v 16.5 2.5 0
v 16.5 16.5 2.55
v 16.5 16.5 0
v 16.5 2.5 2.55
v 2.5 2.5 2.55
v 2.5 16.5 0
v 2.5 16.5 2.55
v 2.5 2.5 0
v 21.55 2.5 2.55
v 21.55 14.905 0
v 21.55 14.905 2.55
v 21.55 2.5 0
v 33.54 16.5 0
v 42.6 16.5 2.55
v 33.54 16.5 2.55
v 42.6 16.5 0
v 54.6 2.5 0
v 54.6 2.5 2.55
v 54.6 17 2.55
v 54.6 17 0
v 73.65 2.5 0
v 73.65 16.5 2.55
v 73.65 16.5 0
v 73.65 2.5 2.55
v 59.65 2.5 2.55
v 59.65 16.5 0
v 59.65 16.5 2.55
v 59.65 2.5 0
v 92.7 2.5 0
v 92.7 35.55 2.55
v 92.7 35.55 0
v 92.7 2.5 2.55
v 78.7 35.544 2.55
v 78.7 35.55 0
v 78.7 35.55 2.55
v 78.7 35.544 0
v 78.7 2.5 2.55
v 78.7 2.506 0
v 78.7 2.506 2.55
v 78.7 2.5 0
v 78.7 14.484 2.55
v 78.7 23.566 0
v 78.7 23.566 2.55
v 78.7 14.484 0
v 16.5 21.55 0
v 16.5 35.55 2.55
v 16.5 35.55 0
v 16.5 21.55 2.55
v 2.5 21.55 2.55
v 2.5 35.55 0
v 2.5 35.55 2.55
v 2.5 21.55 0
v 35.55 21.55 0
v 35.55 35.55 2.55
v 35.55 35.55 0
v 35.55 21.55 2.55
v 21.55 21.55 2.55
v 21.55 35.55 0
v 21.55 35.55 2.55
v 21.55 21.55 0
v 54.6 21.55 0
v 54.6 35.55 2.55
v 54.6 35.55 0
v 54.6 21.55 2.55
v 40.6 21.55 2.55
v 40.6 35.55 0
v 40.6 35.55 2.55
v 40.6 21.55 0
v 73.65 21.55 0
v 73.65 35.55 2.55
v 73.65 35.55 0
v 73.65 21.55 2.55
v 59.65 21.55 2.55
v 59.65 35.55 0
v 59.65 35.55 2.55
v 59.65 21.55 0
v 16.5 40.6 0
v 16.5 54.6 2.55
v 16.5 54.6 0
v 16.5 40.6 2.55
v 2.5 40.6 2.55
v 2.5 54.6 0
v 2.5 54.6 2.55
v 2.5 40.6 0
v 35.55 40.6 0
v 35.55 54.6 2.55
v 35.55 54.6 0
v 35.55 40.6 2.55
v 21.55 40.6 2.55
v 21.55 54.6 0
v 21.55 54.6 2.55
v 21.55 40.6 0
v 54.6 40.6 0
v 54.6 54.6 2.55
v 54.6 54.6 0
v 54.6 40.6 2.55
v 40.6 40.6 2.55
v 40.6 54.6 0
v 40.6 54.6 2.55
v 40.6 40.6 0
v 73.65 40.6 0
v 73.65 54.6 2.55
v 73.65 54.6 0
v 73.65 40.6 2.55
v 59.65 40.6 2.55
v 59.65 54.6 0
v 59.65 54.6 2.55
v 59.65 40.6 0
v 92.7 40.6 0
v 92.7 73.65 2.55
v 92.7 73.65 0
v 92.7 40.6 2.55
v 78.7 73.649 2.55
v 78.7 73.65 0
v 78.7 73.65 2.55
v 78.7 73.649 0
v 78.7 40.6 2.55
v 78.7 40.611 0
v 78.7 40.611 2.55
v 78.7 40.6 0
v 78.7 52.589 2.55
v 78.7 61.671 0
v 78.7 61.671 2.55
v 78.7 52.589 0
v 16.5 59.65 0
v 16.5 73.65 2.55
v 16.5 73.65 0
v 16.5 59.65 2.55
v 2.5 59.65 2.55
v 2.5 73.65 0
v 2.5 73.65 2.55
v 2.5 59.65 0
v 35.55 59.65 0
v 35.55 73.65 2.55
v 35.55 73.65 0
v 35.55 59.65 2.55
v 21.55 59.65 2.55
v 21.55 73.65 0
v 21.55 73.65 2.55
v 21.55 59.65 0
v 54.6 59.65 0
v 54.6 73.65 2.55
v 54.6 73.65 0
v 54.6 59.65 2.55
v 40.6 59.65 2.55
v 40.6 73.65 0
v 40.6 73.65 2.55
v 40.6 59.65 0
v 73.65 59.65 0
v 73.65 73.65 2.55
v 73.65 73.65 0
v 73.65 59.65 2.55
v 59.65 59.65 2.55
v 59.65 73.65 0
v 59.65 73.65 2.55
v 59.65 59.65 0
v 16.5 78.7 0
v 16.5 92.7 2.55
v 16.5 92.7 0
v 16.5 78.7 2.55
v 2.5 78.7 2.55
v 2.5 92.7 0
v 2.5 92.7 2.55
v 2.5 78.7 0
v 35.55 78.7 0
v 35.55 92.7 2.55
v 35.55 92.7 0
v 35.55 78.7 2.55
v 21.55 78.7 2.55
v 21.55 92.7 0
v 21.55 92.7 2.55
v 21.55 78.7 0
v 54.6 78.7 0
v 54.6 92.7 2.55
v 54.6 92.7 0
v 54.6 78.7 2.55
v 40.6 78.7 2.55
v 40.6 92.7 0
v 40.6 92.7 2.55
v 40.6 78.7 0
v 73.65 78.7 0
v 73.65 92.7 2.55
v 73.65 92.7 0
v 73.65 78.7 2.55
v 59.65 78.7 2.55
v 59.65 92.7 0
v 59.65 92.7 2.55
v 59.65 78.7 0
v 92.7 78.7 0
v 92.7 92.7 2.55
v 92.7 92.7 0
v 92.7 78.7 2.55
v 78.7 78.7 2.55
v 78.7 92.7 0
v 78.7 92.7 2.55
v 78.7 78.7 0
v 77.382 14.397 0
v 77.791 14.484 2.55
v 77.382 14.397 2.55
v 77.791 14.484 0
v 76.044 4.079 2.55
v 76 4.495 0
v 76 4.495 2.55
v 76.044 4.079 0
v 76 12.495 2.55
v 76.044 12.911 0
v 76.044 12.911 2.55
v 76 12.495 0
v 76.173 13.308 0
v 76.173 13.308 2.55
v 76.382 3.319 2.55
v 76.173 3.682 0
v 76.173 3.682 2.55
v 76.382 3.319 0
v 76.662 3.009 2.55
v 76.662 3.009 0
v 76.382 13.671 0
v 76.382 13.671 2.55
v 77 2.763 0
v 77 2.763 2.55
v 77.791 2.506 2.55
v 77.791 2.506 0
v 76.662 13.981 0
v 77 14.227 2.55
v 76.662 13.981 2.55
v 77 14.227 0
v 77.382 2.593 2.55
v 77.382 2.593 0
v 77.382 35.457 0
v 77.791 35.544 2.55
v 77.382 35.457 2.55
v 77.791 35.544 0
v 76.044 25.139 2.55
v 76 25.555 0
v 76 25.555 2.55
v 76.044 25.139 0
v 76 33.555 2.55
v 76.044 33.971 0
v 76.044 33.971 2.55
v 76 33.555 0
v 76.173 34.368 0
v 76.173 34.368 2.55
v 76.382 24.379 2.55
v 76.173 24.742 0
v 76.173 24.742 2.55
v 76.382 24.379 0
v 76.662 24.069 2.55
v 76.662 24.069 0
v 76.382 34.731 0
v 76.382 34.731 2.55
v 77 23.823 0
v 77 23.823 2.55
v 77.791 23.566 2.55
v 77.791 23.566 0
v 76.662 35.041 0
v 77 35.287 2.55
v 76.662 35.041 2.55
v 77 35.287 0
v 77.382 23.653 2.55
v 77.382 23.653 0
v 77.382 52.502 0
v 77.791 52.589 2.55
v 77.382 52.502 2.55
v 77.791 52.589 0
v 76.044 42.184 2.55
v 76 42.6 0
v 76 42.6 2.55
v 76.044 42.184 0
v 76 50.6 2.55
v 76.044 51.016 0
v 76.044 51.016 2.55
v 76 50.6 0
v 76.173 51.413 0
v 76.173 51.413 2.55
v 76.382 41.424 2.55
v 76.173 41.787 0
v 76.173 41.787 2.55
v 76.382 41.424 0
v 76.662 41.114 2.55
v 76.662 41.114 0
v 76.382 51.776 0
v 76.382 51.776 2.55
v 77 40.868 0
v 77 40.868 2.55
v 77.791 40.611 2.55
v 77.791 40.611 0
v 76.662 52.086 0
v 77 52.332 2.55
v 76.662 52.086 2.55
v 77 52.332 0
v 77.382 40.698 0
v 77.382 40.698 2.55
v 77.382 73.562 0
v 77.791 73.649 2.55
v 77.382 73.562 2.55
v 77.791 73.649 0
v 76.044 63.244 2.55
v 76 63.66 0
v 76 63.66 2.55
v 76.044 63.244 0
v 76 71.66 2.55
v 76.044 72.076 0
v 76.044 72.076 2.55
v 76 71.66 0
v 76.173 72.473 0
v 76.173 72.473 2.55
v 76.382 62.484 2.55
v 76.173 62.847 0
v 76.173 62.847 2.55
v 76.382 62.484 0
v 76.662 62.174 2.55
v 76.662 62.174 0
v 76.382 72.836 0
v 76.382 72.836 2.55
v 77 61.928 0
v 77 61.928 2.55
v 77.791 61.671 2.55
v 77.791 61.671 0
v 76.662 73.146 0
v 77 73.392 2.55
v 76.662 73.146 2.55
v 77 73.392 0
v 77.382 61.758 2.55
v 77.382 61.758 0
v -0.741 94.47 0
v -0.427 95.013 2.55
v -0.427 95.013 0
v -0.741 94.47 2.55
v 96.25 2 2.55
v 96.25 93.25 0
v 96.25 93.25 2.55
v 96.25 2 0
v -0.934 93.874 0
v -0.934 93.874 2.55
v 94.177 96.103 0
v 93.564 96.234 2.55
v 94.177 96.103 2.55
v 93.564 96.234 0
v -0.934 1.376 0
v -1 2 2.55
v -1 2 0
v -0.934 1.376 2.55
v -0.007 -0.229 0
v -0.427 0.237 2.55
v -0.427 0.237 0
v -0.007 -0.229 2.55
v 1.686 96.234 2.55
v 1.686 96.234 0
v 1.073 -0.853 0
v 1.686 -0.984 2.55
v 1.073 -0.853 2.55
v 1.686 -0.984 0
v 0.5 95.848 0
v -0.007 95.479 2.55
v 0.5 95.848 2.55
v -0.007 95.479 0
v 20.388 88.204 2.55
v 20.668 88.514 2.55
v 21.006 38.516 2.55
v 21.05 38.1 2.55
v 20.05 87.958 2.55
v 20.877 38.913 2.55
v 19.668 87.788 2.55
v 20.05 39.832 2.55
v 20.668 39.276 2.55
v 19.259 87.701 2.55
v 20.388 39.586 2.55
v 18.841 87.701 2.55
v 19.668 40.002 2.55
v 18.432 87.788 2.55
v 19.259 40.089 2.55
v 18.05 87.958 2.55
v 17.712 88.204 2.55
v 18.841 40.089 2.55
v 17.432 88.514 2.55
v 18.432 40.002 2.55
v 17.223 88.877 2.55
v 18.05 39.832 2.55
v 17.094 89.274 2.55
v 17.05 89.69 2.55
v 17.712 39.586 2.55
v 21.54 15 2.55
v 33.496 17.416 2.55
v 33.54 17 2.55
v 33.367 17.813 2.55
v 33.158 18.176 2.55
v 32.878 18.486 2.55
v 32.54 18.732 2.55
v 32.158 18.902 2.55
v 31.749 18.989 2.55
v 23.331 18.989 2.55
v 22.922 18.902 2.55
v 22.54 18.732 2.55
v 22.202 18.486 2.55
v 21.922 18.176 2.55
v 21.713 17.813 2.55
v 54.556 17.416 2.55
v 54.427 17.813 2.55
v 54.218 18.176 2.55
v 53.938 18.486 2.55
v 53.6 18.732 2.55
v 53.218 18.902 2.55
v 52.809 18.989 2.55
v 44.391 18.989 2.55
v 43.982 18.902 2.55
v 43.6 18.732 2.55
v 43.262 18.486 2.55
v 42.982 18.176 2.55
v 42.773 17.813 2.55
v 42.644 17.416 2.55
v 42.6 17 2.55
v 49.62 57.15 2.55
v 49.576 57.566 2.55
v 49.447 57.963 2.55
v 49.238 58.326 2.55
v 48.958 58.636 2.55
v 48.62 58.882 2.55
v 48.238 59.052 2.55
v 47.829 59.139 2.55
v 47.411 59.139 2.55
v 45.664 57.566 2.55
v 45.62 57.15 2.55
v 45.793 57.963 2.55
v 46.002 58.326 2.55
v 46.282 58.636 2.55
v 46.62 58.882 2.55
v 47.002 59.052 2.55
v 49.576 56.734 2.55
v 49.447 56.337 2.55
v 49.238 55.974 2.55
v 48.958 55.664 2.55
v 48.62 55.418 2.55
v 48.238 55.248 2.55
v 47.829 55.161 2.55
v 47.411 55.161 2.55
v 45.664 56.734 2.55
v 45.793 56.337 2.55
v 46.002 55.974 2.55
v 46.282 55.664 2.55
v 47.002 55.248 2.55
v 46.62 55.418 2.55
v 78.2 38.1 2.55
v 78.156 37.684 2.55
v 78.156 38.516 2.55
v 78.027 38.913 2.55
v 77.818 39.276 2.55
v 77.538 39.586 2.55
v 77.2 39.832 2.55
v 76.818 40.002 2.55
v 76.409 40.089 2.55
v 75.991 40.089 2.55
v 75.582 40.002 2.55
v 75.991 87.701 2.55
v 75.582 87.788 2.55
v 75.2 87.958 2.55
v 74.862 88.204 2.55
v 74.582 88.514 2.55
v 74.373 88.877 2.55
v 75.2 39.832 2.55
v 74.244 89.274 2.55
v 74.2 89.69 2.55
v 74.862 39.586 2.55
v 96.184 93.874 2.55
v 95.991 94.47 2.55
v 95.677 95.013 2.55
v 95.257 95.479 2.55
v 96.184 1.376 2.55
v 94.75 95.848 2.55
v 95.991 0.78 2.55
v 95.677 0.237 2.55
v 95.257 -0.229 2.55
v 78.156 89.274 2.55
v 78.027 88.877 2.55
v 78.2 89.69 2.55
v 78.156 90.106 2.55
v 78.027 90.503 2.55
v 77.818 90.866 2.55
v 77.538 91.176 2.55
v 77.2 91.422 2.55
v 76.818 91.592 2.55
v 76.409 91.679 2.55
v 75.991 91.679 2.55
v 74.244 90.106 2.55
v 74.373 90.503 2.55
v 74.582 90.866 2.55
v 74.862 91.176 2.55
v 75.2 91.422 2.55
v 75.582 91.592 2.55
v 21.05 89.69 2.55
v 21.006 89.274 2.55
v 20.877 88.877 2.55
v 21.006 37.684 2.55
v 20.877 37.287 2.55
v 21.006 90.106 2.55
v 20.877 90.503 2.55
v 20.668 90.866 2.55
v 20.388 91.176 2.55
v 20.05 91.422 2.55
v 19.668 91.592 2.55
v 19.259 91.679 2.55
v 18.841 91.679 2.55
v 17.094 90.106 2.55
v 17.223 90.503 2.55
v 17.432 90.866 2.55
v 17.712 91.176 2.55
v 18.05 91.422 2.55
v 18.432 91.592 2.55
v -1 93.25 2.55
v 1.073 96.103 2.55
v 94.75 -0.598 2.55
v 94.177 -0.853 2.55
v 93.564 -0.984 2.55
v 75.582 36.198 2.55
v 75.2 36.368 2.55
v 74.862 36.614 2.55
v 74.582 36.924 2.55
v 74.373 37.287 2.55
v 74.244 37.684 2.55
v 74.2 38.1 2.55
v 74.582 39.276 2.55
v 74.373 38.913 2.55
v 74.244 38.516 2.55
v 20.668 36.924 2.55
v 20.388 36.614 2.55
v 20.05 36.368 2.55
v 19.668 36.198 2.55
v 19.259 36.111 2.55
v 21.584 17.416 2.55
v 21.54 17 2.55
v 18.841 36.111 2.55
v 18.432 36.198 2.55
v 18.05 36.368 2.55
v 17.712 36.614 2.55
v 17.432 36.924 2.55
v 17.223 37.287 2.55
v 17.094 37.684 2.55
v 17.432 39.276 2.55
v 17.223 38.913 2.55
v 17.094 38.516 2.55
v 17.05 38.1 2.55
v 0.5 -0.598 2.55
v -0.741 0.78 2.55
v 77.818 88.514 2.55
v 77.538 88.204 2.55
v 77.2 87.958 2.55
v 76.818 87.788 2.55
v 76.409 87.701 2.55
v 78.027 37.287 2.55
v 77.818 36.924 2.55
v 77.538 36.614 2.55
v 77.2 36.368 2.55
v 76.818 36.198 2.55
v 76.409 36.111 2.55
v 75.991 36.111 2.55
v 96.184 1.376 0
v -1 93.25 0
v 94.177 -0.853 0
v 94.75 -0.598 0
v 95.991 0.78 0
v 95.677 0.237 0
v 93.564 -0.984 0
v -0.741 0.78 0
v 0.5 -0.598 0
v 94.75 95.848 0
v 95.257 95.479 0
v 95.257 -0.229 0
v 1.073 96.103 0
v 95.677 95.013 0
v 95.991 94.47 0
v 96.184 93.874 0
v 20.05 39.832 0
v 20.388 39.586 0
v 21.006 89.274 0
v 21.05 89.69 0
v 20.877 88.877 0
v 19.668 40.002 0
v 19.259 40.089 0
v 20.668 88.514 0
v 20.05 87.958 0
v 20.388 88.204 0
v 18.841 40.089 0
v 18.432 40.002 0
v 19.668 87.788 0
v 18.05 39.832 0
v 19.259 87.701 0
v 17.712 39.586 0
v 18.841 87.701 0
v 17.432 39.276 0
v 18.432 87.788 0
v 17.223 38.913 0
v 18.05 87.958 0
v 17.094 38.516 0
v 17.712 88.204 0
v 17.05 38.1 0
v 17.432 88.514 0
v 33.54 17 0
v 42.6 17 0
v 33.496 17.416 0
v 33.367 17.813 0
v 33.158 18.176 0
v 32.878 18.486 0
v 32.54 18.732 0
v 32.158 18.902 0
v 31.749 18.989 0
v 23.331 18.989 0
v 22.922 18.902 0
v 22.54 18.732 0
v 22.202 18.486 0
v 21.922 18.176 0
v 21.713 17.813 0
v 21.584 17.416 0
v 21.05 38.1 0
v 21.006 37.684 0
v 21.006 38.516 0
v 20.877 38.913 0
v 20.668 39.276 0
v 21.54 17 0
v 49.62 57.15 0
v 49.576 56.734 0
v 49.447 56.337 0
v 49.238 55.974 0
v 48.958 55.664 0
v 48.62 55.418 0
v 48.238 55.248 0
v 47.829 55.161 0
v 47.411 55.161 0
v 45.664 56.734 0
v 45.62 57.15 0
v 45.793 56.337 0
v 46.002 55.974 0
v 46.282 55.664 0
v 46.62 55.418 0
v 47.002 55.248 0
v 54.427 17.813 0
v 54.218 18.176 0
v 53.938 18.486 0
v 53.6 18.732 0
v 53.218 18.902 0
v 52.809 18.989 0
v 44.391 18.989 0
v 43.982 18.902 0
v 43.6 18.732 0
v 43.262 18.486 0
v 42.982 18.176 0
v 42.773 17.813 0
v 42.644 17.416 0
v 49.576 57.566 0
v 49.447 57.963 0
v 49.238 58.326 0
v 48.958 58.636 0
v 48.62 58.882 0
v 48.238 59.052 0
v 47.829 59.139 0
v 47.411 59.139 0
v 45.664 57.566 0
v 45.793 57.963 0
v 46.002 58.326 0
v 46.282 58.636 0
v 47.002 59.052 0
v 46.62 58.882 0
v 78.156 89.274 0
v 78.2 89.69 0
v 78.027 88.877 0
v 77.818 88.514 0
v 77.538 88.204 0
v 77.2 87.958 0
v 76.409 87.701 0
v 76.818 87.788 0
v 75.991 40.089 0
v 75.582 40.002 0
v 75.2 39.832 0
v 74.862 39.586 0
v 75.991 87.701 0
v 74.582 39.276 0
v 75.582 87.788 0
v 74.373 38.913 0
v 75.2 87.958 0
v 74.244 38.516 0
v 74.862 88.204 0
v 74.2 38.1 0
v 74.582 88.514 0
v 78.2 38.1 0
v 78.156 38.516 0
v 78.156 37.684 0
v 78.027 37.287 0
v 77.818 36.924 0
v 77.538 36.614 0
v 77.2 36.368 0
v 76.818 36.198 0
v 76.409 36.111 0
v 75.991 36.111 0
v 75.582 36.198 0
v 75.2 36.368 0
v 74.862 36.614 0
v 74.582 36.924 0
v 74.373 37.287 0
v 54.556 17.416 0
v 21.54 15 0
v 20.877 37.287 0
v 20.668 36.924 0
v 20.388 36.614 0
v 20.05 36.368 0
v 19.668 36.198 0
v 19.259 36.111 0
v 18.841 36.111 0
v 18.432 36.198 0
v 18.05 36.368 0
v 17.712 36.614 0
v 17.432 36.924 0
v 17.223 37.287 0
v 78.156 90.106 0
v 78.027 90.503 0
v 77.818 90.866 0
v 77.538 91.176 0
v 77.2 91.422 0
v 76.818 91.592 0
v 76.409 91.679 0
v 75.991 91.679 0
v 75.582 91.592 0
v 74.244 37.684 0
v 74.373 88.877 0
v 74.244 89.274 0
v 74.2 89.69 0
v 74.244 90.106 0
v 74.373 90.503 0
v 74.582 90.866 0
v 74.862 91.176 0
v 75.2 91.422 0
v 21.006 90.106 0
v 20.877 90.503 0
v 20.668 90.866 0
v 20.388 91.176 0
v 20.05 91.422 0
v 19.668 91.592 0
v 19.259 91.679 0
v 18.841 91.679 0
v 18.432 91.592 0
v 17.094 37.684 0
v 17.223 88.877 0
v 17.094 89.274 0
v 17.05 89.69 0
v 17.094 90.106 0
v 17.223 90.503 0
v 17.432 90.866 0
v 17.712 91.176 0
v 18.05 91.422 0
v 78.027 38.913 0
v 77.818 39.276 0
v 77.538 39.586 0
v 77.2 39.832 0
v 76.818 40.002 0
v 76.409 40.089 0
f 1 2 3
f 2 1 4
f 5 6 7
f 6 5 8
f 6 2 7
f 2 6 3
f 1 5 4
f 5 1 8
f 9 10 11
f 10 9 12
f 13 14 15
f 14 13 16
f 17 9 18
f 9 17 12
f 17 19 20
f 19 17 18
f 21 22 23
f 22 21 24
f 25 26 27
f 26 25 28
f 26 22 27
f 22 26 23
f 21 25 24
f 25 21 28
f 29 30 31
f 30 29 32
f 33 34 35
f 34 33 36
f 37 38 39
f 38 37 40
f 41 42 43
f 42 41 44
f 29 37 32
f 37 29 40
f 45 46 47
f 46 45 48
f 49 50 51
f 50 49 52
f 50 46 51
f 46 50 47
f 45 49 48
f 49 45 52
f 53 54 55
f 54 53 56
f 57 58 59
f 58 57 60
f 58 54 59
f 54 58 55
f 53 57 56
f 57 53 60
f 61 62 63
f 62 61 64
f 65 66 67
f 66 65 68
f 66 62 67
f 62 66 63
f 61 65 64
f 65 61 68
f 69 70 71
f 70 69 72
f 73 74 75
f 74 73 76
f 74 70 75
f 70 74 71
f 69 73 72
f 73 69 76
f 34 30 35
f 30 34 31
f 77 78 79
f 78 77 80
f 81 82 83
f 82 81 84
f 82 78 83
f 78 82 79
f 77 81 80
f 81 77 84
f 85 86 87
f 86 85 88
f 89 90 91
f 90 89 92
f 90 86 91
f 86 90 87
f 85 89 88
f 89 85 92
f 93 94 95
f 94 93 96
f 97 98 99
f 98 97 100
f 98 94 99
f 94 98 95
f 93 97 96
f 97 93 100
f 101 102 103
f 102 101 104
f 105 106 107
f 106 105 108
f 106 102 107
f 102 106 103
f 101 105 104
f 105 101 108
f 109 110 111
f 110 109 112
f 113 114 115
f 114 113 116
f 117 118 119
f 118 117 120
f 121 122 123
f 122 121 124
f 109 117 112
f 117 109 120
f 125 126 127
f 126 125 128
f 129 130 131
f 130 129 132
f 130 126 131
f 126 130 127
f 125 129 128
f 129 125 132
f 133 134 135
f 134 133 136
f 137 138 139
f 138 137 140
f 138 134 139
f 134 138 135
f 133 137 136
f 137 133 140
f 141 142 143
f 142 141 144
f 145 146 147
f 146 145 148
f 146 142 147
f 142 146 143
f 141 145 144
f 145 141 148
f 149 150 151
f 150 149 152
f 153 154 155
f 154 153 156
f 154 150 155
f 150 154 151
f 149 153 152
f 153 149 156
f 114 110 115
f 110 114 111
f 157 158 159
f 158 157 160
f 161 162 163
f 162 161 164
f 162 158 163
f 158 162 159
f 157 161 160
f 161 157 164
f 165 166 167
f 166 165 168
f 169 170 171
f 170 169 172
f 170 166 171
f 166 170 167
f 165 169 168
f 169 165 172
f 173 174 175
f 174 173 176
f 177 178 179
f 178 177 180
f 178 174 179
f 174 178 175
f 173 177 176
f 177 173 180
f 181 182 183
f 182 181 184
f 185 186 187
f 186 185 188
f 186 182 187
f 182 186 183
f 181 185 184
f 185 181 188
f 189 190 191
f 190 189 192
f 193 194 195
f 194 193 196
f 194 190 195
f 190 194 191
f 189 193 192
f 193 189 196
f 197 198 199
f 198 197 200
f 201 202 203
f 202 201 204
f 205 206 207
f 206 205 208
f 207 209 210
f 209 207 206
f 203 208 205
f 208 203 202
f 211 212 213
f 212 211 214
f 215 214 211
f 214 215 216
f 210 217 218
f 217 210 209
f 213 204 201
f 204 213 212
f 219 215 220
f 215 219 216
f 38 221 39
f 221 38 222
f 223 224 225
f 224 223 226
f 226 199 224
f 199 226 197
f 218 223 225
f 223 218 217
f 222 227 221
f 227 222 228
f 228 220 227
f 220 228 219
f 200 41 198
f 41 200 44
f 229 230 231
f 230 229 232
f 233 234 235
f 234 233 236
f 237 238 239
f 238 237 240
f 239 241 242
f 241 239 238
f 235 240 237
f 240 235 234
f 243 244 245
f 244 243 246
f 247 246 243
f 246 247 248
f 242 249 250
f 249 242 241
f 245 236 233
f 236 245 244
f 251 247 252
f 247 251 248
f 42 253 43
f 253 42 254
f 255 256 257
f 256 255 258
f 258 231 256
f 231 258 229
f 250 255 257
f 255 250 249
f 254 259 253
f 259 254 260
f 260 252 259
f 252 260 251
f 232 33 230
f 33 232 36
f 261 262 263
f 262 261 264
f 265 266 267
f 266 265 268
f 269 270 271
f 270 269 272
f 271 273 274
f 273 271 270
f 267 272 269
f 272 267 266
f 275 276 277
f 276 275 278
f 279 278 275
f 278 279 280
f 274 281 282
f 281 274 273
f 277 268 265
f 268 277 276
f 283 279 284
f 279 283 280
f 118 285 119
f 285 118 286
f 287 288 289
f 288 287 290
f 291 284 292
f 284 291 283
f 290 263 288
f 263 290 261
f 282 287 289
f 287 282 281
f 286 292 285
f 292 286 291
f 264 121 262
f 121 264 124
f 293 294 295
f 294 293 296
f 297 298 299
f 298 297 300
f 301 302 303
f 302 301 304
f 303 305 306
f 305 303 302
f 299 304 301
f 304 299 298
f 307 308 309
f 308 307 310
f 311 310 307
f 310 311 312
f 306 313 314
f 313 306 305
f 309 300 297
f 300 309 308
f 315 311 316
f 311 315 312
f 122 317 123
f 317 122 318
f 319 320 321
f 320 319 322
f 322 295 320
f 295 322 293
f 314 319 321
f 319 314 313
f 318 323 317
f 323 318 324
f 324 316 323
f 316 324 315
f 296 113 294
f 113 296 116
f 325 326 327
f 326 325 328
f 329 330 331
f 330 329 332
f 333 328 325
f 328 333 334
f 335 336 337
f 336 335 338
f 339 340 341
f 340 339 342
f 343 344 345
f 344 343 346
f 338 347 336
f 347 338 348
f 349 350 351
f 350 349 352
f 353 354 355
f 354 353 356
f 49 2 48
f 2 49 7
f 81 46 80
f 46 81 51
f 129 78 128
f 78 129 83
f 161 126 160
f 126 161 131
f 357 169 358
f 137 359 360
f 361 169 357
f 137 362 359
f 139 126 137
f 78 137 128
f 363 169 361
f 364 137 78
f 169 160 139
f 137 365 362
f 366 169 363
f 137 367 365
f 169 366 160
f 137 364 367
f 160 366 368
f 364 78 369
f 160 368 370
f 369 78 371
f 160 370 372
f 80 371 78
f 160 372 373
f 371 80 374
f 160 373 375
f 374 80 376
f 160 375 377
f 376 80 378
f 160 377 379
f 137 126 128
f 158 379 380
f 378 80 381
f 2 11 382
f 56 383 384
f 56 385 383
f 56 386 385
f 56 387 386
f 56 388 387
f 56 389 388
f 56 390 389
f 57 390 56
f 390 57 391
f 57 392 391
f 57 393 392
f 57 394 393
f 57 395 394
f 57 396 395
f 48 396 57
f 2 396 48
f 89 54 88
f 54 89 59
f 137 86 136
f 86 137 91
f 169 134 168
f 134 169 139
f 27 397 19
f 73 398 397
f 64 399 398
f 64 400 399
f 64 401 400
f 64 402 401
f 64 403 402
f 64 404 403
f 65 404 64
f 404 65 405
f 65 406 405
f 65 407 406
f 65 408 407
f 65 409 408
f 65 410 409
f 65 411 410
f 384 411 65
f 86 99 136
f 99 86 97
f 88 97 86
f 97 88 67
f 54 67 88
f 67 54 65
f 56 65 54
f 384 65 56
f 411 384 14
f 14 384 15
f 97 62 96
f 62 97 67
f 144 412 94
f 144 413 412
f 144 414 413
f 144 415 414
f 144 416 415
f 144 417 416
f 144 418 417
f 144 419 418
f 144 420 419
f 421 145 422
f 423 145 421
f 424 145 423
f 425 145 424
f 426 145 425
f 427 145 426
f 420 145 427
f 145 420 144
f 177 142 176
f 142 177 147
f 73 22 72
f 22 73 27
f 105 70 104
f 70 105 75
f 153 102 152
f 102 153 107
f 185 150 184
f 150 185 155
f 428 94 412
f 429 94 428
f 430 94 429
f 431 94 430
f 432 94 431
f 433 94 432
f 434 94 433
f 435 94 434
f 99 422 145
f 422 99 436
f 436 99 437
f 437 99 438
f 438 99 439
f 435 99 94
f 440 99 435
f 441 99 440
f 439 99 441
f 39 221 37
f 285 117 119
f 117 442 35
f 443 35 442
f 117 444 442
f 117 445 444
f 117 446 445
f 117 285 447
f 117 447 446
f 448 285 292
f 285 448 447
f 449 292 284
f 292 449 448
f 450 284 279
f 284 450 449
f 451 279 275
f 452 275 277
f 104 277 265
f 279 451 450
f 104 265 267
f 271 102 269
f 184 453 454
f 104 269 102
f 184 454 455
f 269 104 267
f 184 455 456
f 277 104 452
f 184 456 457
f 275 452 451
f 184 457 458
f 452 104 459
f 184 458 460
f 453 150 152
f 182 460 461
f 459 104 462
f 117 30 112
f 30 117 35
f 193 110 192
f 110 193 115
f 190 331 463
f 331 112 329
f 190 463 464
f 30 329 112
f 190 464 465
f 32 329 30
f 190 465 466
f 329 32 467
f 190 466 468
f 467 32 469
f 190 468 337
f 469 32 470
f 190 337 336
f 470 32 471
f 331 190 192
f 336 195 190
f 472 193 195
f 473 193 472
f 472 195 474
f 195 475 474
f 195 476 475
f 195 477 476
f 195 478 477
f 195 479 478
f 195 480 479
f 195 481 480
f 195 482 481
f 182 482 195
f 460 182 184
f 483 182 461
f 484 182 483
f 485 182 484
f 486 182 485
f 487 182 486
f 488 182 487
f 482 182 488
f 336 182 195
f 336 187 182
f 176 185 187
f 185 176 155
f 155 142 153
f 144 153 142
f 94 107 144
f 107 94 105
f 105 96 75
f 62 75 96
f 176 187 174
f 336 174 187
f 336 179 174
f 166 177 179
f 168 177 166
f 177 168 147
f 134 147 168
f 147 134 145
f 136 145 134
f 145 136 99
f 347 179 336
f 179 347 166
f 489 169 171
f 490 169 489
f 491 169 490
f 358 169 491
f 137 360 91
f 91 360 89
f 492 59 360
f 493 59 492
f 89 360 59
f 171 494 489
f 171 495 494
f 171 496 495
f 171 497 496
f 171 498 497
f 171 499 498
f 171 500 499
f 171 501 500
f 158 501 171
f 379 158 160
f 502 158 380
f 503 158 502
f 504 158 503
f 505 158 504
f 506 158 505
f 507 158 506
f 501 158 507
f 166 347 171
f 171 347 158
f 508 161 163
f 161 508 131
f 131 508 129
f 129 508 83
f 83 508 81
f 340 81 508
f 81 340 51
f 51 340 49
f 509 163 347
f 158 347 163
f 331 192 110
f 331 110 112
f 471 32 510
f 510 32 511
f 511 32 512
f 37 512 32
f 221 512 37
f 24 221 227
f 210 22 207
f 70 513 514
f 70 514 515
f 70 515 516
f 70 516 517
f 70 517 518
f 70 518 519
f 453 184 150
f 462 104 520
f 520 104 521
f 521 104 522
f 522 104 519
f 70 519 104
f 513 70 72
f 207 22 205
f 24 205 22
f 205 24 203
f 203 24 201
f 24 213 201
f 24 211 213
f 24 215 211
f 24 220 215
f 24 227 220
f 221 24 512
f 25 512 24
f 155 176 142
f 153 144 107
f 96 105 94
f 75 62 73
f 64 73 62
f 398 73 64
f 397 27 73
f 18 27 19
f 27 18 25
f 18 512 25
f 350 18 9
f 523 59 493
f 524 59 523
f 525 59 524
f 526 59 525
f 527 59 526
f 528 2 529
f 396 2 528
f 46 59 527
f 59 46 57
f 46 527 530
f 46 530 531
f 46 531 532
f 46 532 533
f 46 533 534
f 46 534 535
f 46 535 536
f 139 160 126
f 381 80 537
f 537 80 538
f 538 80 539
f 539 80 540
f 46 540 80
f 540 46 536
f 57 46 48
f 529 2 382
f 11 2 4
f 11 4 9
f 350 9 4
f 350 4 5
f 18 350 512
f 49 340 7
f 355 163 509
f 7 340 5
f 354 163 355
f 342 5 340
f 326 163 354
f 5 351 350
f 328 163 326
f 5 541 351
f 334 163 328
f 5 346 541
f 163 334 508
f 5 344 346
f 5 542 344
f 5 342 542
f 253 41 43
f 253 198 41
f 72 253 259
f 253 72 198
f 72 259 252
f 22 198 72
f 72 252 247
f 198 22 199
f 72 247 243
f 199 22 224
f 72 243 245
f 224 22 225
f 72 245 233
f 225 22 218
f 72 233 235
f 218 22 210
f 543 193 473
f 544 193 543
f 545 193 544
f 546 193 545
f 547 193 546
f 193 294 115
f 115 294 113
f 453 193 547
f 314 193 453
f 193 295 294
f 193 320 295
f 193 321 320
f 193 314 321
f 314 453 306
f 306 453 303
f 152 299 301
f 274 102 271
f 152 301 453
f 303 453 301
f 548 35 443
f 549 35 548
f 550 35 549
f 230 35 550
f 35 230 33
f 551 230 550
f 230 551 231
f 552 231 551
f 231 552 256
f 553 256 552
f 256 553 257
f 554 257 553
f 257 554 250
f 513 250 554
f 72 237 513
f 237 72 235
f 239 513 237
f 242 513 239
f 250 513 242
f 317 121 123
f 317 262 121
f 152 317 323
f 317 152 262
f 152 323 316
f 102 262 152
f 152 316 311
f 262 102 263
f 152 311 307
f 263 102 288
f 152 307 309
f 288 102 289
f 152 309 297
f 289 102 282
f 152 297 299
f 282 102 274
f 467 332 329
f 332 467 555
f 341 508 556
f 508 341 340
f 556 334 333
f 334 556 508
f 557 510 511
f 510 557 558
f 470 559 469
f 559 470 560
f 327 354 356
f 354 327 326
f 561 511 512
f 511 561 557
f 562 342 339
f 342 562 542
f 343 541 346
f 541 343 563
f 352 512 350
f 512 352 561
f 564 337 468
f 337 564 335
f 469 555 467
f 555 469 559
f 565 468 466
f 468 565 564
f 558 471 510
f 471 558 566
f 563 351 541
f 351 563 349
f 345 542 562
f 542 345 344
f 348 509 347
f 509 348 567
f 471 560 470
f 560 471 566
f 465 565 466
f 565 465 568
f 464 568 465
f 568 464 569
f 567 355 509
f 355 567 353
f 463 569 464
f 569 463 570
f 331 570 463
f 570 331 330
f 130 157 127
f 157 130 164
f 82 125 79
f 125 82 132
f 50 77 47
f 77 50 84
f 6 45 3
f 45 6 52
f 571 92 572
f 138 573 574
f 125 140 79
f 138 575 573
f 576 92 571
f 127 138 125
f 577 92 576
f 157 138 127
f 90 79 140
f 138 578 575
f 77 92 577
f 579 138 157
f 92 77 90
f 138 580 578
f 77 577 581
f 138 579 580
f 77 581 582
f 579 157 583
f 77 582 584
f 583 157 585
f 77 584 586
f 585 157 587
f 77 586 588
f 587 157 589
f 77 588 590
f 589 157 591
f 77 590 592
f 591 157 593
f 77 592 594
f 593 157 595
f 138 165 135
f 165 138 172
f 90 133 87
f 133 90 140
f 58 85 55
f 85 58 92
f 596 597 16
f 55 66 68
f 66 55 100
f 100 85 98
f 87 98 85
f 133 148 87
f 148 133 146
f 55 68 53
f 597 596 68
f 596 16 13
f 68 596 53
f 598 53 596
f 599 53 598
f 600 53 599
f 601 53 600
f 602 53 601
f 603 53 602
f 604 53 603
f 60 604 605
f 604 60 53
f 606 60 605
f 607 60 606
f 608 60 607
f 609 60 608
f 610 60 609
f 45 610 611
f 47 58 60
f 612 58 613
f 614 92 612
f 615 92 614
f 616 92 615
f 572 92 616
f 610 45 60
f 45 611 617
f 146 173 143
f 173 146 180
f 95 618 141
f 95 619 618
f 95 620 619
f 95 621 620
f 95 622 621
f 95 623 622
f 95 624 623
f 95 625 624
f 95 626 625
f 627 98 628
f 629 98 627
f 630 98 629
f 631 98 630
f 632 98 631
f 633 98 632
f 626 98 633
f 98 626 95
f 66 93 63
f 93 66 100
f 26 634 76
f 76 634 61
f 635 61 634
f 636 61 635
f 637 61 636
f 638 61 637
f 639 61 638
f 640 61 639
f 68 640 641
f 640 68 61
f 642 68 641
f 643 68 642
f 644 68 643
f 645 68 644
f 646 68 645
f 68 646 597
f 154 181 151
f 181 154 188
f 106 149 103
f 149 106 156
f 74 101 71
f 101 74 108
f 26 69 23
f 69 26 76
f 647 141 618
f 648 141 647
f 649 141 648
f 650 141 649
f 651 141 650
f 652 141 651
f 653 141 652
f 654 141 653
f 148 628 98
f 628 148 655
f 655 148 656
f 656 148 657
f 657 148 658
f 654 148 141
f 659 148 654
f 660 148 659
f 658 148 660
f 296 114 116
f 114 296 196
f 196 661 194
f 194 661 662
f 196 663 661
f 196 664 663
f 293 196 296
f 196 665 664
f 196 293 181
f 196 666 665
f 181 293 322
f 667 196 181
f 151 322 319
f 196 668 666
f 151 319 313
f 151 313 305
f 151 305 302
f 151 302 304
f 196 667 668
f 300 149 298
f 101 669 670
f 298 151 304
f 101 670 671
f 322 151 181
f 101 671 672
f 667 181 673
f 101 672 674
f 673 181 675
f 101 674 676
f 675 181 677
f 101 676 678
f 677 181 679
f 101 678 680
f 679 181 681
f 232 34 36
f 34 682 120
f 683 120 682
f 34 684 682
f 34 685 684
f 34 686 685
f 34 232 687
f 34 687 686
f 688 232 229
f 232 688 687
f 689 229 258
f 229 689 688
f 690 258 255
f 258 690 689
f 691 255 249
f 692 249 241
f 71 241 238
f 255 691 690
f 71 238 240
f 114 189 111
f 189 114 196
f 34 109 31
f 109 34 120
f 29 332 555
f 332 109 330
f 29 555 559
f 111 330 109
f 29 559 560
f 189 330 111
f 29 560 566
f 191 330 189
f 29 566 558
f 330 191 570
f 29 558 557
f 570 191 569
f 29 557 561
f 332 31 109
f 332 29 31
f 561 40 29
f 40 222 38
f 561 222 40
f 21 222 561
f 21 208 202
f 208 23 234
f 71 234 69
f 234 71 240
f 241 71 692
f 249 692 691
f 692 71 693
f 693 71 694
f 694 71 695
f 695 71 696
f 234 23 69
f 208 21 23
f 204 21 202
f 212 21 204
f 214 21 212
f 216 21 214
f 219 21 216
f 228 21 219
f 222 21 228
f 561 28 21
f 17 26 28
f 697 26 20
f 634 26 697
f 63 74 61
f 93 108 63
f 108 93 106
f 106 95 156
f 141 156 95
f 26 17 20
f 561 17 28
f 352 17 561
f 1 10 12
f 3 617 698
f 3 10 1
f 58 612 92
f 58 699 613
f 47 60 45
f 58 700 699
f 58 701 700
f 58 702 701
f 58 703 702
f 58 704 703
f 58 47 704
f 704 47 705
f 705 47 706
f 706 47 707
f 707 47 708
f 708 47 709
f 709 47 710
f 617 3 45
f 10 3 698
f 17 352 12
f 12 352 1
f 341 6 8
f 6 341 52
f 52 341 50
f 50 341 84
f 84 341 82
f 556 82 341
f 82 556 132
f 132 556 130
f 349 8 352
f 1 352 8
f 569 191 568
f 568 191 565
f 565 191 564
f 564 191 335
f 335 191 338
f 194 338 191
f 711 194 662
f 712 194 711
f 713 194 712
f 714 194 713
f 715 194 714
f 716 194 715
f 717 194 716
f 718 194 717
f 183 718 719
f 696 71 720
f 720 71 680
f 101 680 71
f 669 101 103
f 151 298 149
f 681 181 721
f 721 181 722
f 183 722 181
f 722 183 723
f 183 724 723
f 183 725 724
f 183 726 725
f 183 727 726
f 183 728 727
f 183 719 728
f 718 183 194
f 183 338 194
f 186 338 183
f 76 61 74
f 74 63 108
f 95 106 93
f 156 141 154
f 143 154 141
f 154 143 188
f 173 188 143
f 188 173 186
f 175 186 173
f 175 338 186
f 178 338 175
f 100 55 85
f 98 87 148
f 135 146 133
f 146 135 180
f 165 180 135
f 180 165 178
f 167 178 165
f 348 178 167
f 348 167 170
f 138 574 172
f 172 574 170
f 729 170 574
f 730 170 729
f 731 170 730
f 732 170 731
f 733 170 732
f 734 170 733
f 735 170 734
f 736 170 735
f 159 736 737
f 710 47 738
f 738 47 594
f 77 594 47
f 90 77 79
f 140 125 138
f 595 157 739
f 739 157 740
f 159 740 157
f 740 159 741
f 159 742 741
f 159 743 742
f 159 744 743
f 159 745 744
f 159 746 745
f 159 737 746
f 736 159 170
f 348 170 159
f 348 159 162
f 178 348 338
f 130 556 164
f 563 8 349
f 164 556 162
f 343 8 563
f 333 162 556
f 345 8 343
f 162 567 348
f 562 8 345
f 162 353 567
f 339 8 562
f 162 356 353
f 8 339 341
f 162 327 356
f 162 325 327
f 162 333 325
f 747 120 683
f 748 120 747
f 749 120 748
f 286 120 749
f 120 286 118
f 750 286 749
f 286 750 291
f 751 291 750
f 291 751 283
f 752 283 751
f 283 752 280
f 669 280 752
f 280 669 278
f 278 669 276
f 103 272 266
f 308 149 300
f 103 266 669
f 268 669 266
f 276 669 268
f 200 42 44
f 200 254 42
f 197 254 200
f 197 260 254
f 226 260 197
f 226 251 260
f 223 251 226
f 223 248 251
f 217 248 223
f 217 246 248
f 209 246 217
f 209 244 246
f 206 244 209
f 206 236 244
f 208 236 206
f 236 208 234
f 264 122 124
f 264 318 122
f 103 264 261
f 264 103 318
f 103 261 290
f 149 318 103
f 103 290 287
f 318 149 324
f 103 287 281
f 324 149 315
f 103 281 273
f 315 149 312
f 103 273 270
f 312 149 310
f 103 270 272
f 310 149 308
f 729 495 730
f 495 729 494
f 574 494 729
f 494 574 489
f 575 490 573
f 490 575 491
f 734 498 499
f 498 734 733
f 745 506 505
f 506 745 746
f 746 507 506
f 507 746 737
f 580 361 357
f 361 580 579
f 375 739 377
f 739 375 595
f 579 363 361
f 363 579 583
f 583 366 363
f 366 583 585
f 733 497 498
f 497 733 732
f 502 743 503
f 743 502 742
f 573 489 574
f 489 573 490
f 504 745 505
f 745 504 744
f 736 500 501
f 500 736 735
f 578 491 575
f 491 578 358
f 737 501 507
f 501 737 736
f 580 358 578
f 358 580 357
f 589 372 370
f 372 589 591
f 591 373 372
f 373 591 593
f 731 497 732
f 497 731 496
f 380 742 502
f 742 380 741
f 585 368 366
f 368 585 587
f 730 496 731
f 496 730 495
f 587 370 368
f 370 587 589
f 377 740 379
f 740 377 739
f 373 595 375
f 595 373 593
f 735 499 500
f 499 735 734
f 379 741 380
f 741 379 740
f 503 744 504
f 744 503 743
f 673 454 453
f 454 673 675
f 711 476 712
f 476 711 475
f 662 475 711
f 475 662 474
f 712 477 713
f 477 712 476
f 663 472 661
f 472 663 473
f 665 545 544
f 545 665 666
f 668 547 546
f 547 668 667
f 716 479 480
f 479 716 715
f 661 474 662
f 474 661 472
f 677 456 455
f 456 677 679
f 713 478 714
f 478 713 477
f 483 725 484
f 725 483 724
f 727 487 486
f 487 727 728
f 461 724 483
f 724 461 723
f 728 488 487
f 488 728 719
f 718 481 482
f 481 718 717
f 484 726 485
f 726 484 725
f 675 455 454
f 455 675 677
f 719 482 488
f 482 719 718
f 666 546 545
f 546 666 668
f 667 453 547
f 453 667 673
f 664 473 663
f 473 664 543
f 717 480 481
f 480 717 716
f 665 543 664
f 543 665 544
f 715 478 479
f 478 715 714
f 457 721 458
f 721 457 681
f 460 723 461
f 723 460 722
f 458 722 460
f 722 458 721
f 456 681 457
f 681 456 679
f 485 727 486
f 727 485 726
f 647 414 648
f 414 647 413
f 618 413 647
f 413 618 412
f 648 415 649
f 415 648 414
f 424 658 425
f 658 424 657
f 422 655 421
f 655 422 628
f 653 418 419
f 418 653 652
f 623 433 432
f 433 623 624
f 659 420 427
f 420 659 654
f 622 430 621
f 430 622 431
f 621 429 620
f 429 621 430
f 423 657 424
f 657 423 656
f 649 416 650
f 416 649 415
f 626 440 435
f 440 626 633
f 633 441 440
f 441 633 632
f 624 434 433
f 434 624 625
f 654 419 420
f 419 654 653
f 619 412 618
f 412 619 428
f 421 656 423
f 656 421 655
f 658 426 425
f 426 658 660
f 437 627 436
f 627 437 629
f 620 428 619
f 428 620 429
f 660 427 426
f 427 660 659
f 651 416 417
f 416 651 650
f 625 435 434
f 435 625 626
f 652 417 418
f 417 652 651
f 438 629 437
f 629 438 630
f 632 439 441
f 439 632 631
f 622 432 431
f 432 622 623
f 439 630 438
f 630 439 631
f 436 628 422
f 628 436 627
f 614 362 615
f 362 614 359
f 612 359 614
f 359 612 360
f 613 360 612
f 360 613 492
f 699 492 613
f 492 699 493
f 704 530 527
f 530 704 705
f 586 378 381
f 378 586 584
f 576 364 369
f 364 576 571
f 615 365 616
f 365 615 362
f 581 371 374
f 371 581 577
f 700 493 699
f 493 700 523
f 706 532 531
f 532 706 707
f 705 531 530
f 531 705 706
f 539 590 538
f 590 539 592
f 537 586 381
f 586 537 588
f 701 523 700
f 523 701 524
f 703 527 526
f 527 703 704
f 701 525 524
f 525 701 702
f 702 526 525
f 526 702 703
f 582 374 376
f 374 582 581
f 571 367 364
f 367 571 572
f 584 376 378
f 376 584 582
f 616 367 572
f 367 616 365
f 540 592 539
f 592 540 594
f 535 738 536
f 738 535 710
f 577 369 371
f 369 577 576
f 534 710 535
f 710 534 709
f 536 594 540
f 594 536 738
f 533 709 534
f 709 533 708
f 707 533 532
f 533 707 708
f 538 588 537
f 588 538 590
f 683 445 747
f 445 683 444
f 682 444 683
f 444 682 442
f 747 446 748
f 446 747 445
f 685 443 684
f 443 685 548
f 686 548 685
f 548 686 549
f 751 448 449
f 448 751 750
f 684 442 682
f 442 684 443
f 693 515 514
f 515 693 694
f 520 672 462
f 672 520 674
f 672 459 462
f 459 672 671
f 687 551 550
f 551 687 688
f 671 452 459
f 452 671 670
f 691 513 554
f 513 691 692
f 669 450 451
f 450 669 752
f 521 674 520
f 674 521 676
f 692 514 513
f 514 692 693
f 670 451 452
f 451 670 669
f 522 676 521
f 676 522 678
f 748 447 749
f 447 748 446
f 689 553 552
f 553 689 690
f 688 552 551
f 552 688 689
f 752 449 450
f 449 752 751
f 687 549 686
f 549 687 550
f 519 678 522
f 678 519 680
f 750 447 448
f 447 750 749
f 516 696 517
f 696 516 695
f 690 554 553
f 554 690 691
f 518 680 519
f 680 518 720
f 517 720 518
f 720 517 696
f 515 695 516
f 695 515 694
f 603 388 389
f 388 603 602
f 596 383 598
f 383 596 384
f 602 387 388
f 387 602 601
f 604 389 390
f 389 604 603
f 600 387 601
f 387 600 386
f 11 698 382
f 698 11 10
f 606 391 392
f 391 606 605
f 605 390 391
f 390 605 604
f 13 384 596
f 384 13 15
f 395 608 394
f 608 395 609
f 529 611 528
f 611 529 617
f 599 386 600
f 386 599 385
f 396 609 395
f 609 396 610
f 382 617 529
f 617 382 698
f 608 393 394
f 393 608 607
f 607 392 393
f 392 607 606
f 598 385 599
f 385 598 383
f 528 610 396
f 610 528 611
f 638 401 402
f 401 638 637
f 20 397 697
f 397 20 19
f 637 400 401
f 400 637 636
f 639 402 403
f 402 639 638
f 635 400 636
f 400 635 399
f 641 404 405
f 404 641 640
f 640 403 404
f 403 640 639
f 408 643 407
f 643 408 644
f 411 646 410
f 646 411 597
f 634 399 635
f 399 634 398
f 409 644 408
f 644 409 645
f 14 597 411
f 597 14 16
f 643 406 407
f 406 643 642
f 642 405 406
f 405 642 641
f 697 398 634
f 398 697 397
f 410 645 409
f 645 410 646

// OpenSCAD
/* 2u's Plate */
difference() {
    translate([2,2,0])
    color([0.5,0.5,0.5])  minkowski(){
        cube([91.25,91.25,2.5]);
        cylinder($fn=30,r=3, h=0.05);
    }
    
    /* Screw holes */
    /* Top */
    translate([19.05,89.69,0])
            color([1,1,1]) cylinder($fn=30,h=15,d=4, center=true);
    translate([76.20,89.69,0])
            color([1,1,1]) cylinder($fn=30,h=15,d=4, center=true);
    /* Center */
    translate([47.62,57.15,0])
            color([1,1,1]) cylinder($fn=30,h=15,d=4, center=true);
    /* Bottom */
    translate([19.05,38.10,0])
            color([1,1,1]) cylinder($fn=30,h=15,d=4, center=true);
    translate([76.20,38.10,0])
            color([1,1,1]) cylinder($fn=30,h=15,d=4, center=true);
    
    
    /* Switch cutouts */
    translate([2.5,2.5,-1])
    {
        /* Row 0 */
        translate([0,0,0])
        {
            cube([14,14,8]);
            
            translate([19.05,0,0])
            cube([28,14,8]);
            
            translate([38.1,0,0])
            cube([14,14,8]);
            
            translate([57.15,0,0])
            cube([14,14,8]);
            
            translate([76.2,0,0])
            cube([14,28,8]);
        }
        
        /* Row 1 */
        translate([0,19.05,0])
        {
            cube([14,14,8]);
            
            translate([19.05,0,0])
            cube([14,14,8]);
            
            translate([38.1,0,0])
            cube([14,14,8]);
            
            translate([57.15,0,0])
            cube([14,14,8]);
            
            translate([76.2,0,0])
            cube([14,14,8]);
        }
        
        /* Row 2 */
        translate([0,38.1,0])
        {
            cube([14,14,8]);
            
            translate([19.05,0,0])
            cube([14,14,8]);
            
            translate([38.1,0,0])
            cube([14,14,8]);
            
            translate([57.15,0,0])
            cube([14,14,8]);
            
            translate([76.2,0,0])
            cube([14,28,8]);
        }
        
        /* Row 3 */
        translate([0,57.15,0])
        {
            cube([14,14,8]);
            
            translate([19.05,0,0])
            cube([14,14,8]);
            
            translate([38.1,0,0])
            cube([14,14,8]);
            
            translate([57.15,0,0])
            cube([14,14,8]);
            
            translate([76.2,0,0])
            cube([14,14,8]);
        }
        
        /* Row 4 */
        translate([0,76.2,0])
        {
            cube([14,14,8]);
            
            translate([19.05,0,0])
            cube([14,14,8]);
            
            translate([38.1,0,0])
            cube([14,14,8]);
            
            translate([57.15,0,0])
            cube([14,14,8]);
            
            translate([76.2,0,0])
            cube([14,14,8]);
        }
    }
    
    /* Stab Cutouts */
    
    /* Zero key */
    translate([23.54,15,-1])
    color([0.5,0.5,0.5])  minkowski(){
        cube([8,2,5]);
        cylinder($fn=30,r=2, h=0.05);
    }
    translate([44.6,15,-1])
    color([0.5,0.5,0.5])  minkowski(){
        cube([8,2,5]);
        cylinder($fn=30,r=2, h=0.05);
    }
    
    /* Enter key */
    translate([78,4.495,0])
    {
        translate([0,0,-1])
        color([0.5,0.5,0.5])  minkowski(){
            cube([2,8,5]);
            cylinder($fn=30,r=2, h=0.05);
        }
        translate([0,21.06,-1])
        color([0.5,0.5,0.5])  minkowski(){
            cube([2,8,5]);
            cylinder($fn=30,r=2, h=0.05);
        }
    }
    
    /* Plus key */
    translate([78,42.6,0])
    {
        translate([0,0,-1])
        color([0.5,0.5,0.5])  minkowski(){
            cube([2,8,5]);
            cylinder($fn=30,r=2, h=0.05);
        }
        translate([0,21.06,-1])
        color([0.5,0.5,0.5])  minkowski(){
            cube([2,8,5]);
            cylinder($fn=30,r=2, h=0.05);
        }
    }
}
